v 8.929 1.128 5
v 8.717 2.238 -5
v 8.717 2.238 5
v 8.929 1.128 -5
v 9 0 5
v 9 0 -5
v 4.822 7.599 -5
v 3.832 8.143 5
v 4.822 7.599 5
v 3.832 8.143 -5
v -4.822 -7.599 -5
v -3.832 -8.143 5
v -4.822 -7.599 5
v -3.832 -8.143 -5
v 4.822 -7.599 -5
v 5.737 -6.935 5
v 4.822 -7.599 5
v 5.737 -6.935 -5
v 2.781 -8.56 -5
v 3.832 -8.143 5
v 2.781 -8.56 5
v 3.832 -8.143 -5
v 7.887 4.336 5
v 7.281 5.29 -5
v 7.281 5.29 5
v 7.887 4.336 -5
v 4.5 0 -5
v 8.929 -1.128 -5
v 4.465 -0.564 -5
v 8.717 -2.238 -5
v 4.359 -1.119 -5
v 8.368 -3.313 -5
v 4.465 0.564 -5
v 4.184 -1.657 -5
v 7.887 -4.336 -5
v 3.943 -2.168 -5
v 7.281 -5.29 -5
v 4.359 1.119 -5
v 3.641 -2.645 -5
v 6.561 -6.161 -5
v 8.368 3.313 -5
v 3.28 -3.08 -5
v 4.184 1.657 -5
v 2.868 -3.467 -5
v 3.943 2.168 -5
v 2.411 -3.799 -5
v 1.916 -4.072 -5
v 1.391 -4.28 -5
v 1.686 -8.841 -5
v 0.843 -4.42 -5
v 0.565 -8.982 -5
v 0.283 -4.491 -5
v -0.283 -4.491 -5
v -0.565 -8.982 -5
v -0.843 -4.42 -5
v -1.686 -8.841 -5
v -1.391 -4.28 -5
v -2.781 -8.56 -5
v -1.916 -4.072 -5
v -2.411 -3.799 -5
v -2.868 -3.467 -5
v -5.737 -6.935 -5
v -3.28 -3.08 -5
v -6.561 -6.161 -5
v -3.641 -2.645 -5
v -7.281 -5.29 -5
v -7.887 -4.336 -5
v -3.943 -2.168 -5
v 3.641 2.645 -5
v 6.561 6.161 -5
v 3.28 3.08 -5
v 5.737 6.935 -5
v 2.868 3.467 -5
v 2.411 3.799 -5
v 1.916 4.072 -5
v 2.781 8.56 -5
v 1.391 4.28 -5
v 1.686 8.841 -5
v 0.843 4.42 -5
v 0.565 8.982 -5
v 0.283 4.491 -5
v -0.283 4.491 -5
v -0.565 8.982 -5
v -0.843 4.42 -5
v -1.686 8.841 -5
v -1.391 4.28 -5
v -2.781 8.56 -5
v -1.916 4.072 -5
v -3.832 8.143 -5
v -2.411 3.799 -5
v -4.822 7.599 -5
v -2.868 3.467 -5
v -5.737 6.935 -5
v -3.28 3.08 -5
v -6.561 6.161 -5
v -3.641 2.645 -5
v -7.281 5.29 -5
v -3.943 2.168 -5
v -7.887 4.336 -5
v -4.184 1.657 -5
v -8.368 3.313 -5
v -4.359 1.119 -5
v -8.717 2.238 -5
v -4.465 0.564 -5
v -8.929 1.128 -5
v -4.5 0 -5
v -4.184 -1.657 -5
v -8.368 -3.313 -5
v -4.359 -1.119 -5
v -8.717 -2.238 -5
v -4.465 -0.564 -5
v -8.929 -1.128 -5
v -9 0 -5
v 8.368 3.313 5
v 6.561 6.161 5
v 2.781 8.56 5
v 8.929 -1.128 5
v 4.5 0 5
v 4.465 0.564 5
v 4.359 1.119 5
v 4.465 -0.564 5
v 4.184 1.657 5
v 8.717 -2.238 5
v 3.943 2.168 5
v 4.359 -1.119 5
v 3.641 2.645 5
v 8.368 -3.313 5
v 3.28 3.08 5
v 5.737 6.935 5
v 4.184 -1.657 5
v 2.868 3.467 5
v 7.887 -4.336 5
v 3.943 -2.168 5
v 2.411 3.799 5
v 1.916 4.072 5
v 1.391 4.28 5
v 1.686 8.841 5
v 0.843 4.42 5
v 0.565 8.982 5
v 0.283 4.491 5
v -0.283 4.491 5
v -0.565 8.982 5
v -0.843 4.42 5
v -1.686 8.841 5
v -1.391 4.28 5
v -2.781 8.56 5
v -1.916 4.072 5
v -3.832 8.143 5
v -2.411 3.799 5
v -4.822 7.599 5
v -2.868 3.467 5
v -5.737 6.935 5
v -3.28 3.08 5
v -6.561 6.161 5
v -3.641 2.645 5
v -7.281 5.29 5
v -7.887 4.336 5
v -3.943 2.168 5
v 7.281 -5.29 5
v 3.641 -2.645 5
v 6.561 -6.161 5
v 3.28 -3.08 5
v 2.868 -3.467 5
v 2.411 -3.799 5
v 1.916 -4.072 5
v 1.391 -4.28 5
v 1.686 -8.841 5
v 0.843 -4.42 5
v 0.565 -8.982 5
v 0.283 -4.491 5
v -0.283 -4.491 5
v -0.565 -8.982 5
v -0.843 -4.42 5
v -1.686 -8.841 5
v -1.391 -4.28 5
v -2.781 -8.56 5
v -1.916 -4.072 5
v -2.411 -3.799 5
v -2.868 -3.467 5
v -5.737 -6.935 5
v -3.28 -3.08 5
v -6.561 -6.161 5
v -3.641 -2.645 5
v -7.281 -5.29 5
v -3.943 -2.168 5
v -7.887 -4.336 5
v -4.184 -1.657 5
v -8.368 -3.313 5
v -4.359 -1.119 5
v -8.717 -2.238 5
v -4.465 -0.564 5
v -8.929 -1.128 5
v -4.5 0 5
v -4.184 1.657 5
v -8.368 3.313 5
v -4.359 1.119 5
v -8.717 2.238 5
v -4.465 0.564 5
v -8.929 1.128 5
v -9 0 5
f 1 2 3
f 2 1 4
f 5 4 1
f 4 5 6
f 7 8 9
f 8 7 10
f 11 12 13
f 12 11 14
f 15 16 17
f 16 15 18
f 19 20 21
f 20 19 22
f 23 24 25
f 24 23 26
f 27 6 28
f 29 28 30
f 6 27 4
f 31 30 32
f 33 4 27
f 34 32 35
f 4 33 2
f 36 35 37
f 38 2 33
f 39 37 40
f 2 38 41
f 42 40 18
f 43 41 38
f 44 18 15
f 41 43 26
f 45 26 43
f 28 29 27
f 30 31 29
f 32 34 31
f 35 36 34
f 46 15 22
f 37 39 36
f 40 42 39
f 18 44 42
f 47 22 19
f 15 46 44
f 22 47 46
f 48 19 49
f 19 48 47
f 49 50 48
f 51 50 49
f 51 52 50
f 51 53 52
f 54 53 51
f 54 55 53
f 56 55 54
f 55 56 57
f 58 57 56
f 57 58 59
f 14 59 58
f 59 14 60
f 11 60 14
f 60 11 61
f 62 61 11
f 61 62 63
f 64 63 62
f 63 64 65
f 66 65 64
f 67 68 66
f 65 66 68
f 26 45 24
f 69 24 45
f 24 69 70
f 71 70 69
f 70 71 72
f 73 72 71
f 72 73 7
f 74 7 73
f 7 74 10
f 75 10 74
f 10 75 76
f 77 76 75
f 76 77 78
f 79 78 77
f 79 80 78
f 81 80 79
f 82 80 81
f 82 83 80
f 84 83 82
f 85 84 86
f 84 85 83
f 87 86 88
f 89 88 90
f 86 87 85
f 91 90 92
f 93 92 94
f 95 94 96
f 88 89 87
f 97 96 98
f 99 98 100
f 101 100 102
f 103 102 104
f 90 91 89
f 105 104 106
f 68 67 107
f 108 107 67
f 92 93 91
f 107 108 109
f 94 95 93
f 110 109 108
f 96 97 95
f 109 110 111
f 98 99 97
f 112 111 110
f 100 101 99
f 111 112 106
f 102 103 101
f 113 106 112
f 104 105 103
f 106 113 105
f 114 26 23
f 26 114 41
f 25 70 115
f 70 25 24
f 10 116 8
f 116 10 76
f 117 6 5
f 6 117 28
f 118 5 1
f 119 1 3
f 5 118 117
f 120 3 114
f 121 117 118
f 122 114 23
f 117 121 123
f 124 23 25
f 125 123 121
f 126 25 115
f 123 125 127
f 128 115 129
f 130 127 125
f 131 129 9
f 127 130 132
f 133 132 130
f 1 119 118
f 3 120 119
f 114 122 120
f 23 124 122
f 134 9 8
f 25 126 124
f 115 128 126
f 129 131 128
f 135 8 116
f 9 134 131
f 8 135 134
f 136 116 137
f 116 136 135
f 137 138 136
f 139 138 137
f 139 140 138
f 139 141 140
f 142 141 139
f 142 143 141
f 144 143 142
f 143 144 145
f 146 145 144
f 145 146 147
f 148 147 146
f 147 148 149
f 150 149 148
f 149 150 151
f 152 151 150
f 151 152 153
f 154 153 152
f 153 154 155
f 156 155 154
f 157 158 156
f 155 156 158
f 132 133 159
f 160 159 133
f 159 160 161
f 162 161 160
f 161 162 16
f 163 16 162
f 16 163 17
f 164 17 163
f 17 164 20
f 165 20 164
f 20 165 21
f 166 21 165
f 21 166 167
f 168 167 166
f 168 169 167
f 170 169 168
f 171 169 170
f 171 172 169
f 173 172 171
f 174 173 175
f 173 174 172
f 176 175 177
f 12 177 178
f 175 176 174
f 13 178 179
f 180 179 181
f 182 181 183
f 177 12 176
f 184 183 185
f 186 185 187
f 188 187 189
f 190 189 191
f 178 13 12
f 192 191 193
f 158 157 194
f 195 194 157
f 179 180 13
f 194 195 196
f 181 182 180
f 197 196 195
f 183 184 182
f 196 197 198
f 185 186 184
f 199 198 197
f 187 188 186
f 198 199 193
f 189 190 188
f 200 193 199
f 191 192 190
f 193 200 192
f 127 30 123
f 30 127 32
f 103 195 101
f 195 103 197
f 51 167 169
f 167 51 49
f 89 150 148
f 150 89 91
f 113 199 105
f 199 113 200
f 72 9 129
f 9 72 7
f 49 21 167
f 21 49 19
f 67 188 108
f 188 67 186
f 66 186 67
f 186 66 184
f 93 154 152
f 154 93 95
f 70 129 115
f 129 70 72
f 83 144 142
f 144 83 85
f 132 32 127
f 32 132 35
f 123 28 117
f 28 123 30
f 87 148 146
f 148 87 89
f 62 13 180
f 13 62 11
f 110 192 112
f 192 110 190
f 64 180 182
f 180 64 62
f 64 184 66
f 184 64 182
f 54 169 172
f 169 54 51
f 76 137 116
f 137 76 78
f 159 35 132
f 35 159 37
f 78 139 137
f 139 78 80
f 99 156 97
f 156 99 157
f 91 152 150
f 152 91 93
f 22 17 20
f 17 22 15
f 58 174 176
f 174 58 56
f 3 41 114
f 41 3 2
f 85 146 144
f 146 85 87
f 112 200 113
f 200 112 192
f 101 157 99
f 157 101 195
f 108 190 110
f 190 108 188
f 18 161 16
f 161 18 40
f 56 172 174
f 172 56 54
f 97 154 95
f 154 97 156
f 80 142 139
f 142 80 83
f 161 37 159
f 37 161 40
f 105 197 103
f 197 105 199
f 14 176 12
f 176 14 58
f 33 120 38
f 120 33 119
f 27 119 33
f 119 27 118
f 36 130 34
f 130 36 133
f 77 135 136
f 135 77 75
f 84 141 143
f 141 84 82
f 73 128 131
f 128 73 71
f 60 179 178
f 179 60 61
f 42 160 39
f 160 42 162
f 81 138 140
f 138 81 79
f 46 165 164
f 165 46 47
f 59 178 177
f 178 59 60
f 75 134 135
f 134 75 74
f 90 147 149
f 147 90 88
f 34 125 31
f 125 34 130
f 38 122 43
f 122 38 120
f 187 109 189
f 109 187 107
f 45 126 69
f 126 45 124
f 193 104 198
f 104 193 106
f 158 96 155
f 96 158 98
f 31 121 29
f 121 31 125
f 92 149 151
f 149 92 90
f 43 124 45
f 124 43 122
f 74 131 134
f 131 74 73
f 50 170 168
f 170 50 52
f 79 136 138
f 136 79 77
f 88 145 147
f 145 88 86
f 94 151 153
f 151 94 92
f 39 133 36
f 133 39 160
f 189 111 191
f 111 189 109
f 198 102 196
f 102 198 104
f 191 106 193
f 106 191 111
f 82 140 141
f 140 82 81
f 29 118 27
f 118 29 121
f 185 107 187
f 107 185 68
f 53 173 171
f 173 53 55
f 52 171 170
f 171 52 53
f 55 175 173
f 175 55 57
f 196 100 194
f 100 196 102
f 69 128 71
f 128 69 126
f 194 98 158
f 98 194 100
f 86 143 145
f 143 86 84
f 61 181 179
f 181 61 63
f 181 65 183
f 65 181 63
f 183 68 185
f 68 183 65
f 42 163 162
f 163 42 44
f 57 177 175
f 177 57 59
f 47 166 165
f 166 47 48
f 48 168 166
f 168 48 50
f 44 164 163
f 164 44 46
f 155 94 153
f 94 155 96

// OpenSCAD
$fn = 50;


difference() {
	union() {
		translate(v = [0, 0, -5.0000000000]) {
			cylinder(h = 10, r = 9.0000000000);
		}
	}
	union() {
		translate(v = [0, 0, -100.0000000000]) {
			cylinder(h = 200, r = 4.5000000000);
		}
	}
}
